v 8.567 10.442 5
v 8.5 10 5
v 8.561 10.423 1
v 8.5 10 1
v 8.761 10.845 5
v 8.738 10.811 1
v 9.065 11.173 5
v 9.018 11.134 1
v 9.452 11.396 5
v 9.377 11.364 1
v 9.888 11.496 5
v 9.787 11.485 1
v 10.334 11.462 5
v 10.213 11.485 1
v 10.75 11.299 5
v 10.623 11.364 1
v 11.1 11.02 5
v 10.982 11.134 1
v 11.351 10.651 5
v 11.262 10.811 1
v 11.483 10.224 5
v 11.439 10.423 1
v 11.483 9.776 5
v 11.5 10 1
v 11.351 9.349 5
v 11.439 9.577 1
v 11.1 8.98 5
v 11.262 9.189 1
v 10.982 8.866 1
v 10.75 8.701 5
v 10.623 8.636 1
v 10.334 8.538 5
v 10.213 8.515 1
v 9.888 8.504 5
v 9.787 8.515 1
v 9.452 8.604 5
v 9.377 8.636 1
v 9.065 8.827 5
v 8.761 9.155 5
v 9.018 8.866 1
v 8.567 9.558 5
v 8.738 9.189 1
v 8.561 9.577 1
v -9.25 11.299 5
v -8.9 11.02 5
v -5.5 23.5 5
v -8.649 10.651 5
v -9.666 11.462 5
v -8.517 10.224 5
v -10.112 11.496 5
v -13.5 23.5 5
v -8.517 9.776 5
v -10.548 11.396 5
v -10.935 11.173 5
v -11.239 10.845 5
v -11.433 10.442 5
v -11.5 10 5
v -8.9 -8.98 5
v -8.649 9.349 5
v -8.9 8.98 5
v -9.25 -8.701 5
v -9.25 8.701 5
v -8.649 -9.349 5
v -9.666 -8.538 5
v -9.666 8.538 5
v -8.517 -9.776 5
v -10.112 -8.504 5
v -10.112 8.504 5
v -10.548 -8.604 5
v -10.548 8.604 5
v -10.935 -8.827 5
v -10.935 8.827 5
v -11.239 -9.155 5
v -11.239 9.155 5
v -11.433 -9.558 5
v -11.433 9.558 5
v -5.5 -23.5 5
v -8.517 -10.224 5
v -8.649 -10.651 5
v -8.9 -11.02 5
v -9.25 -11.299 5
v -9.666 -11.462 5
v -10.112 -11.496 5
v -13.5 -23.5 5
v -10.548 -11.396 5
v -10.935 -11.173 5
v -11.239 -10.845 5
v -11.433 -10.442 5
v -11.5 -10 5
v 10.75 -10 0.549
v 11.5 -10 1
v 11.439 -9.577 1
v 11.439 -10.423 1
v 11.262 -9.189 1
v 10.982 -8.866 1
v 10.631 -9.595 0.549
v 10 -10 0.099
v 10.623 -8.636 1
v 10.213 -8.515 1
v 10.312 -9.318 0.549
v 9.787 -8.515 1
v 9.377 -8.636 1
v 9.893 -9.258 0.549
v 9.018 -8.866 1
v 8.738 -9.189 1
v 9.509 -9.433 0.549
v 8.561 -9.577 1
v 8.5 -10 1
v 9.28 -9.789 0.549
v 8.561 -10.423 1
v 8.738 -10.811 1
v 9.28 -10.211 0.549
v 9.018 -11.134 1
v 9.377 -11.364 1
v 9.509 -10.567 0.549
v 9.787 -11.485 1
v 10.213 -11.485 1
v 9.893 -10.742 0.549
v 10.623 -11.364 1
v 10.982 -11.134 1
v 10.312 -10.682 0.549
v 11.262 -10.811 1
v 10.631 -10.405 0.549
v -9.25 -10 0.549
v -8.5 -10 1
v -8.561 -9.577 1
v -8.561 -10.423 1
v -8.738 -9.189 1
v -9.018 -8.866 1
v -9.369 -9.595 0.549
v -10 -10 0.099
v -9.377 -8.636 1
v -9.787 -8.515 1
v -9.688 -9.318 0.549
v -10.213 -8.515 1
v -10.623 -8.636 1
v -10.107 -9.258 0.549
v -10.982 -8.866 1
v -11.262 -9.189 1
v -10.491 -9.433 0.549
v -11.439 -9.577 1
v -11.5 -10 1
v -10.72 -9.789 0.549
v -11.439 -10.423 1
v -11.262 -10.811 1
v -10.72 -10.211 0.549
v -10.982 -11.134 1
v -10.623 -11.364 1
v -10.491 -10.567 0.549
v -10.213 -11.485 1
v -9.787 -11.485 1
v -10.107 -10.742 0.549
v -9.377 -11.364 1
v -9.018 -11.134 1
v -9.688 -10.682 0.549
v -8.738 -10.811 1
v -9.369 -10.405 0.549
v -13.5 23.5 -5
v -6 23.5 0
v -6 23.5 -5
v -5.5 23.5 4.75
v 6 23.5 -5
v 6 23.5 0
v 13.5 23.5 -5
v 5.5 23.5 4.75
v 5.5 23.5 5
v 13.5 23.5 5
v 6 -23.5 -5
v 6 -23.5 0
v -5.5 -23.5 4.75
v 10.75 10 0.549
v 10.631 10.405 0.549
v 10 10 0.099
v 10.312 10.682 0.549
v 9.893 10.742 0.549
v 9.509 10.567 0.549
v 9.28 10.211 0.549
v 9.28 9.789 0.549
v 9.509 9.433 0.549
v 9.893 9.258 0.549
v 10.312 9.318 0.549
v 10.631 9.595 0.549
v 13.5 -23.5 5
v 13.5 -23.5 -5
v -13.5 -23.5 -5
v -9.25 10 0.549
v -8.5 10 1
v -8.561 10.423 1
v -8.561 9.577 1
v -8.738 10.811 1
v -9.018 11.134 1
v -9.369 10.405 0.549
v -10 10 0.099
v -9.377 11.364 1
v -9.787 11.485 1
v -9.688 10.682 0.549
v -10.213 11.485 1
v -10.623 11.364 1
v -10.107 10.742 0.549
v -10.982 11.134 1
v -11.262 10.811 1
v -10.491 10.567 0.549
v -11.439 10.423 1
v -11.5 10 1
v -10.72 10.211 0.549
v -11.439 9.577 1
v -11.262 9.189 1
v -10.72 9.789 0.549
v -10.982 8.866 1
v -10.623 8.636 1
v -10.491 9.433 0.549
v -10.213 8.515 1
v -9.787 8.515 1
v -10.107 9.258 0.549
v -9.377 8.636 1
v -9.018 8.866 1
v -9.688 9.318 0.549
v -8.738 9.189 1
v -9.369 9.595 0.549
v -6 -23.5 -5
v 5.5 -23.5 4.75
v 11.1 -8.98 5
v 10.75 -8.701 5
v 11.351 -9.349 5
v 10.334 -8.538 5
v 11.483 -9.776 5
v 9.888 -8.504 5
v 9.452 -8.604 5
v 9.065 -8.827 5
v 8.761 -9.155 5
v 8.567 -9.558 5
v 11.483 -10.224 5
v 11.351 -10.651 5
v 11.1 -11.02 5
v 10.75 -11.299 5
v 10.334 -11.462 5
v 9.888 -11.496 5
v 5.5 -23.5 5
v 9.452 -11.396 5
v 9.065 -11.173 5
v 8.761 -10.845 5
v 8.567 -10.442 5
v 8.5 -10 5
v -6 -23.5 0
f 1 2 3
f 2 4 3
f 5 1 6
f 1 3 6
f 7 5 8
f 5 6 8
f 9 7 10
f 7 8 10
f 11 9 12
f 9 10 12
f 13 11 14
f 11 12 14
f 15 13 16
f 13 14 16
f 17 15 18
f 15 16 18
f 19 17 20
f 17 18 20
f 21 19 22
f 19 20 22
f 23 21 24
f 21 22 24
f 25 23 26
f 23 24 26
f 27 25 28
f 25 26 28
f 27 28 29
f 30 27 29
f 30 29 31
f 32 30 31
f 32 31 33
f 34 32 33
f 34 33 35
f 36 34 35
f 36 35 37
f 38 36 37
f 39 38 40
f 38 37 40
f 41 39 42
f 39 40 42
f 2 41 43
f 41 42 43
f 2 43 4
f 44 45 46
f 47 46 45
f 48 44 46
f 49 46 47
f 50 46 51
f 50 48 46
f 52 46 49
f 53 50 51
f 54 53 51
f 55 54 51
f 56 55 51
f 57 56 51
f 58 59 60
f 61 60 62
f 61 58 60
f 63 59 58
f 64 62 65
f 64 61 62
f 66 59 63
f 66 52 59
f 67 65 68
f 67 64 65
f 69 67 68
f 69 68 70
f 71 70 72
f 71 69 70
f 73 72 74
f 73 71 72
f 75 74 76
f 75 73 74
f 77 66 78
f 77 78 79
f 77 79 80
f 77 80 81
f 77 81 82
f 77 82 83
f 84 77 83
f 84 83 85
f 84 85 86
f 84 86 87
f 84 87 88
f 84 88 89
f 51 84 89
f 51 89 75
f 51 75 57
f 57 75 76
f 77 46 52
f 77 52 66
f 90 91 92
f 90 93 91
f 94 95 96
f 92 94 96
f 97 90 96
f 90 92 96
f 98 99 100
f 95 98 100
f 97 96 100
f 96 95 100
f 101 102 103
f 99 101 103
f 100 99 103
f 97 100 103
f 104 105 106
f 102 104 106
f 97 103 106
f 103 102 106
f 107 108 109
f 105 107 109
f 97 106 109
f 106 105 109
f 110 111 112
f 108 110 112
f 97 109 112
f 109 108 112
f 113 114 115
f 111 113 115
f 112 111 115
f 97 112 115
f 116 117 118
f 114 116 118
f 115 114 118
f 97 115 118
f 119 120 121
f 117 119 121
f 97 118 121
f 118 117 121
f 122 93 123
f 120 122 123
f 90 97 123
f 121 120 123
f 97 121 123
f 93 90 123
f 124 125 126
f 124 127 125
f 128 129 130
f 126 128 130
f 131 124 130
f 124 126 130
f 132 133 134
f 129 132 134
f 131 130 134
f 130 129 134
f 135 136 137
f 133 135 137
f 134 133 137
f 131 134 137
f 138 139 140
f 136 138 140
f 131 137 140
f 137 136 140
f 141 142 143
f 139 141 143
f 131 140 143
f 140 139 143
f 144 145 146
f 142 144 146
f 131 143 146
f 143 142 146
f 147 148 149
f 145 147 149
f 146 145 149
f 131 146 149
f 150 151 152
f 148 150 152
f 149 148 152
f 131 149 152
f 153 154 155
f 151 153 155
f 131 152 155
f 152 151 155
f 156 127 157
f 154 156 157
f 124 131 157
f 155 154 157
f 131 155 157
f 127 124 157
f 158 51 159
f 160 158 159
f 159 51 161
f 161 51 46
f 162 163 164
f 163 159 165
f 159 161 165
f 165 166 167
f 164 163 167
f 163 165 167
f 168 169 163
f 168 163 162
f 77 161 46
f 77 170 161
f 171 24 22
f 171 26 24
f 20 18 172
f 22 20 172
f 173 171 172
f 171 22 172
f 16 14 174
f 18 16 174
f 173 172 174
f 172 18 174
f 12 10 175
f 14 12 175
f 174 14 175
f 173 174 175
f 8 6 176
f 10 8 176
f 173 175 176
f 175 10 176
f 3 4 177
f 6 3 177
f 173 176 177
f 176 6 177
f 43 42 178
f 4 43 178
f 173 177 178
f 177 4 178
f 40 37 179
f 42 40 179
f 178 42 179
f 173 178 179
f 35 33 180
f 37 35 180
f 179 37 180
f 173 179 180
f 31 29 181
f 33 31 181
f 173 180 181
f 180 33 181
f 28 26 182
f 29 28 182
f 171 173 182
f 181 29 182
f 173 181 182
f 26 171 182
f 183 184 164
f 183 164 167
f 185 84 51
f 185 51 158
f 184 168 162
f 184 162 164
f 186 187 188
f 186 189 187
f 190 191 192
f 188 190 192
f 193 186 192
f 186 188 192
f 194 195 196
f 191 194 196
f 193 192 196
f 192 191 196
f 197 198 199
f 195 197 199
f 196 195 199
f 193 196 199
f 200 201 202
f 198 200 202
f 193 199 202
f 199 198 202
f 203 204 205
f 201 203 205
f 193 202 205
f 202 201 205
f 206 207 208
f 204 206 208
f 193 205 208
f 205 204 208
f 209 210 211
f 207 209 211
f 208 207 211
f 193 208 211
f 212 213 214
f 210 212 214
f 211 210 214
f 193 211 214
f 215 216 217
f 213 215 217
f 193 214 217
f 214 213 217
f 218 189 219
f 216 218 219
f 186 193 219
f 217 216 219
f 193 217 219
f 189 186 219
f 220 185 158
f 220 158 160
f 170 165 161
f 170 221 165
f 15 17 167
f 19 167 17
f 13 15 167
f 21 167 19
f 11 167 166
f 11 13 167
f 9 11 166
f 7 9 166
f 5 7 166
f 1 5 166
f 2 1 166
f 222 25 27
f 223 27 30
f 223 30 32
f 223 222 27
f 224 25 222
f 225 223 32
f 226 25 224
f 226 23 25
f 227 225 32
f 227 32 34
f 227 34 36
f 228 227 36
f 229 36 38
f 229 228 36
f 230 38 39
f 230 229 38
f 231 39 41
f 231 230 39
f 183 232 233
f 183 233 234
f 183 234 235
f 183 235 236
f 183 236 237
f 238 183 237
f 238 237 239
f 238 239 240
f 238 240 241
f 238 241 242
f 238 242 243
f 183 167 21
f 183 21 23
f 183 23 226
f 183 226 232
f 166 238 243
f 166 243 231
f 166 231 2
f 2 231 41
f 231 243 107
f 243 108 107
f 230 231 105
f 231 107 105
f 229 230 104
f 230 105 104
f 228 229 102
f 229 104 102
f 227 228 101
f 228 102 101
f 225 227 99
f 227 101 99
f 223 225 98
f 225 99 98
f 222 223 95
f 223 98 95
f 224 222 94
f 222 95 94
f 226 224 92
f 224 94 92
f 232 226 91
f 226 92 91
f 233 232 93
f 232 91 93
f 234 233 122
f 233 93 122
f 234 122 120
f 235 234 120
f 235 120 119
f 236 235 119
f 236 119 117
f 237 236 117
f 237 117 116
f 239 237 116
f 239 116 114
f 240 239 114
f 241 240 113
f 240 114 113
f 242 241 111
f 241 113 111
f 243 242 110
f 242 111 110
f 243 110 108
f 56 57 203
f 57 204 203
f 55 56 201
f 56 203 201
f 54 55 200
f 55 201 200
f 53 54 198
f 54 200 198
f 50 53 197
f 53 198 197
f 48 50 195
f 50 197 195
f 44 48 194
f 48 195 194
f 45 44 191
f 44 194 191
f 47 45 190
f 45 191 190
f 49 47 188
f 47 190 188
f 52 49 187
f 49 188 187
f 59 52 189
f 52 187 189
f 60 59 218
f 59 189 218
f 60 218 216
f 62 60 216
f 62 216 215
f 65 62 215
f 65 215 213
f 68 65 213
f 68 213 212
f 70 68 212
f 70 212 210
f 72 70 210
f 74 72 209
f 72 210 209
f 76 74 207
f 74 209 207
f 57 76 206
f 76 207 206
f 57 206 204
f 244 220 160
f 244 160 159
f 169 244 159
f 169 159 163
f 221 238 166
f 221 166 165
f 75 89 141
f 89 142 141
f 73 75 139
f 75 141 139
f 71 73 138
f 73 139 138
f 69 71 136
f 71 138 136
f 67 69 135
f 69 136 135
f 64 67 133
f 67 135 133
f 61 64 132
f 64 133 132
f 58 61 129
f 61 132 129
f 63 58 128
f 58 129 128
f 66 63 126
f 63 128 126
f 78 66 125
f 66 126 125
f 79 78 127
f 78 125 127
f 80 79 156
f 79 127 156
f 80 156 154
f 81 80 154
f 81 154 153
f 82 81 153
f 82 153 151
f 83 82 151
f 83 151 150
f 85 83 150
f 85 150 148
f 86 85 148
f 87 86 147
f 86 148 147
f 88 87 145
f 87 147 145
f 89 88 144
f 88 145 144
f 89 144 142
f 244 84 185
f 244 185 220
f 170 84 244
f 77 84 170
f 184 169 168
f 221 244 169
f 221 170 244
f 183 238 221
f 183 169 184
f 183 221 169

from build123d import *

# Parameters (mm, degrees)
F1_DEPTH = 23.5
F3_D     = 3
F3_DEPTH = 4
F3_TIP   = 0.9012909285


with BuildPart() as f1:
    # F0 (on Front) → F1 (new body, symmetric)
    with BuildSketch(Plane.XZ):
        Polygon((-5.5, 5), (-13.5, 5), (-13.5, -5), (-6, -5), (-6, 0), (6, 0), (6, -5), (13.5, -5), (13.5, 5), (5.5, 5), (5.5, 4.75), (-5.5, 4.75), align=None)
    extrude(amount=F1_DEPTH, both=True)

    # F3
    with Locations(Plane.XY.offset(5)):
        with Locations((-10.0000007078, 10), (10.0000007078, 10), (10.0000007078, -10), (-10.0000007078, -10)):
            Hole(F3_D / 2, depth=F3_DEPTH)
            with Locations((0, 0, -(F3_DEPTH + F3_TIP / 2))):  # 118° drill point
                Cone(0, F3_D / 2, F3_TIP, mode=Mode.SUBTRACT)


solid = f1.part
